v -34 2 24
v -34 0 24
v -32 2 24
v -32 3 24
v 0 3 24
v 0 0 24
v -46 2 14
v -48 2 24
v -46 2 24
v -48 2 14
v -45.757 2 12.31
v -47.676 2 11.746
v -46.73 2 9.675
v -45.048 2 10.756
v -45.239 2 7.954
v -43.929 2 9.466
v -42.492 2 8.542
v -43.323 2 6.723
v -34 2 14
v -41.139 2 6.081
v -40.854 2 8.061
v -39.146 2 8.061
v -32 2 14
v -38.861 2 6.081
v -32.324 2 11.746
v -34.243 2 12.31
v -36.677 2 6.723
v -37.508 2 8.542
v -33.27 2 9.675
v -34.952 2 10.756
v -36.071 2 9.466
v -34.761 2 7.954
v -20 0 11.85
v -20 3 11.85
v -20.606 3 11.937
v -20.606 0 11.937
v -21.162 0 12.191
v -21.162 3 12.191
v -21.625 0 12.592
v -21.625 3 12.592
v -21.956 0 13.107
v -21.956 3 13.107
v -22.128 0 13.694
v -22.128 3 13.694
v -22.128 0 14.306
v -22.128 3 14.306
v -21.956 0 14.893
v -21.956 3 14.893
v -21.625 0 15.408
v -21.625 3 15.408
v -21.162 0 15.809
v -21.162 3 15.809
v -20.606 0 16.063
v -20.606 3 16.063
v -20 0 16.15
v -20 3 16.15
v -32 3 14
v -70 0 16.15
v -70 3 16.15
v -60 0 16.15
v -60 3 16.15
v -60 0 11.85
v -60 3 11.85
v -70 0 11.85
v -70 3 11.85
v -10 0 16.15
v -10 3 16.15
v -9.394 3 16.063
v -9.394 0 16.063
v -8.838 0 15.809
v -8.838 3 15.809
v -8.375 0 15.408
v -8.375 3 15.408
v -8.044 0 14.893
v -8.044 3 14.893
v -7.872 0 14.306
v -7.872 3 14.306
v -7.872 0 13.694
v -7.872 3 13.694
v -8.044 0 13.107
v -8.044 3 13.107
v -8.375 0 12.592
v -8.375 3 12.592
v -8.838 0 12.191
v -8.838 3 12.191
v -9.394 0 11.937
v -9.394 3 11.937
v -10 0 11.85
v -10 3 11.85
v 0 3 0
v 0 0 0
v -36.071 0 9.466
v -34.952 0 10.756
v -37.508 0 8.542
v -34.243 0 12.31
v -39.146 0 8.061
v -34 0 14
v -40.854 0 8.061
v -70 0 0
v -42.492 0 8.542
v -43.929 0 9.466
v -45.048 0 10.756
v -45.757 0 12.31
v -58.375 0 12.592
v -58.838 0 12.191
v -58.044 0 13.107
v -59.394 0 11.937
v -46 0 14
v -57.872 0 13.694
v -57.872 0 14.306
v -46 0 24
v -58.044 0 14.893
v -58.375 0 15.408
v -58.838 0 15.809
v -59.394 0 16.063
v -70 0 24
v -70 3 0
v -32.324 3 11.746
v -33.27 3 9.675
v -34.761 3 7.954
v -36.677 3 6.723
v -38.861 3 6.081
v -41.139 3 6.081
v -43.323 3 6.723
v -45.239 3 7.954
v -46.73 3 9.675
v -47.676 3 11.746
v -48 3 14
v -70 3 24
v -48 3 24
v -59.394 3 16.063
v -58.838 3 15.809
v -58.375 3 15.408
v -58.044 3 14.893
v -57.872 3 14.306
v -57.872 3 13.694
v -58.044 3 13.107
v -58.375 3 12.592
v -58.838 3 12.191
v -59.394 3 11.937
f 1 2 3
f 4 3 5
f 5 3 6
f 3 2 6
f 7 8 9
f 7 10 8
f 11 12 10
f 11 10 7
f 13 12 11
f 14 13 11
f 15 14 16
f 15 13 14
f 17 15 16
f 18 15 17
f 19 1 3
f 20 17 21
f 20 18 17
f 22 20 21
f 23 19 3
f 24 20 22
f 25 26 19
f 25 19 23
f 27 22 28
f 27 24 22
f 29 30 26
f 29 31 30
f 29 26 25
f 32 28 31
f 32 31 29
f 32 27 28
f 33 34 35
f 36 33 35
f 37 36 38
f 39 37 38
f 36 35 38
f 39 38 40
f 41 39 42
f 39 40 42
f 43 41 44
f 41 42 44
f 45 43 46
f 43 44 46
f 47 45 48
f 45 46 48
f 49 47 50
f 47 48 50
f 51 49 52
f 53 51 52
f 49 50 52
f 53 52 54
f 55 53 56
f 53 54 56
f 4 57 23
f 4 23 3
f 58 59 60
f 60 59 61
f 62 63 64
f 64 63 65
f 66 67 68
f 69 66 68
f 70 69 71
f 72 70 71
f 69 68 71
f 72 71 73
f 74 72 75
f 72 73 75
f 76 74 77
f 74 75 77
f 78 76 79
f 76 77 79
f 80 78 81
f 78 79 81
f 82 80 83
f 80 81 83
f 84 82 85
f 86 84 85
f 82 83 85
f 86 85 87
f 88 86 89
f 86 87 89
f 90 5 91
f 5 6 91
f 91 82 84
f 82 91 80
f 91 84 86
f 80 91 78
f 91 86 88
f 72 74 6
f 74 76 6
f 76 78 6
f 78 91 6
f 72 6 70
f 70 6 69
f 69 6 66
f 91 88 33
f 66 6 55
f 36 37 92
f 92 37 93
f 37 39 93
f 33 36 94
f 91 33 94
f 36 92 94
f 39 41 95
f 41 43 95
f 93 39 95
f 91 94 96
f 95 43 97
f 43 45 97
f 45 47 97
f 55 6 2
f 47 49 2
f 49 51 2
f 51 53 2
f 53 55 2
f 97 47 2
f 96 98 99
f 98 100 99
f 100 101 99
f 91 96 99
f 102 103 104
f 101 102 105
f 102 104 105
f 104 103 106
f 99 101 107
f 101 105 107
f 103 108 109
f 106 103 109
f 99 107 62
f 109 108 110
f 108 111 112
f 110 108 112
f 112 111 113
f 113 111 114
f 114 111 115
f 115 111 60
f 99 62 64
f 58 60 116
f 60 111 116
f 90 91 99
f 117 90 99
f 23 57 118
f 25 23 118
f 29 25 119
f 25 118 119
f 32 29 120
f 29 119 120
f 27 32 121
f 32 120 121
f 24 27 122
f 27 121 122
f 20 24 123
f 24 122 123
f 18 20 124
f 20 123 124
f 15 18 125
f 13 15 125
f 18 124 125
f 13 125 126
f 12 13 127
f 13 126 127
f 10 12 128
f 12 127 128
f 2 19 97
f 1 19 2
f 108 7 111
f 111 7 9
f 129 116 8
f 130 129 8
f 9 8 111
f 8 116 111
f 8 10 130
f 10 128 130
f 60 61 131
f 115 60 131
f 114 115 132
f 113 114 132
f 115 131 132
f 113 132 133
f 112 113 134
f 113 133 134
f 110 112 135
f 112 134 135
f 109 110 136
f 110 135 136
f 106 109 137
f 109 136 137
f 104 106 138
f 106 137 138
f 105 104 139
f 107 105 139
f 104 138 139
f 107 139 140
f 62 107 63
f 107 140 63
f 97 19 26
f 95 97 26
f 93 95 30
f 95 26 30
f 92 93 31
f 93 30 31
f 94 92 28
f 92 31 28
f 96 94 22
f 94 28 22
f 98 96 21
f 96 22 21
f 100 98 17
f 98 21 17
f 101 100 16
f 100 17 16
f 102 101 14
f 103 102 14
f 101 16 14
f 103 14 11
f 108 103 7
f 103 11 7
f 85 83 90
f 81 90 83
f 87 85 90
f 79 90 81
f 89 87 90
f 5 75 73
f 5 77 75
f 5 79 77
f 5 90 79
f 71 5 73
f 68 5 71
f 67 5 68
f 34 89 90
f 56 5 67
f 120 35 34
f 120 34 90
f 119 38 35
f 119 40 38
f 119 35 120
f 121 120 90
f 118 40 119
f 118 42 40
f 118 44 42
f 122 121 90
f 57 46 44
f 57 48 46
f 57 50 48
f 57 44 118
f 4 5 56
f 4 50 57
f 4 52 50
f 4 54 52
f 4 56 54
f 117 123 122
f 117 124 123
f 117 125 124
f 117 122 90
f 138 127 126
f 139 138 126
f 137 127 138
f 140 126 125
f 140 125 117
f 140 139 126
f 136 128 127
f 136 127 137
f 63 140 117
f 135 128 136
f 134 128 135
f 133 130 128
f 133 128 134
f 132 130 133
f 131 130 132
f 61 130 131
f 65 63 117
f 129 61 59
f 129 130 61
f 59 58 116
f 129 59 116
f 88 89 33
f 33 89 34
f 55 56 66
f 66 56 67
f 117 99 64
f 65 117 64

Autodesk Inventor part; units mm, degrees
ref_plane "YZ Plane" through (0, 0, 0) normal (1, 0, 0) x (0, 1, 0)
ref_plane "XZ Plane" through (0, 0, 0) normal (0, 1, 0) x (-1, 0, 0)
ref_plane "XY Plane" through (0, 0, 0) normal (0, 0, 1) x (1, 0, 0)
sketch "Sketch1" plane through (0, 0, 0) normal (0, 1, 0) x (-1, 0, 0)
  line L0 (0, 0) -> (70, 0)
  line L1 (70, 0) -> (70, 24)
  line L2 (70, 24) -> (0, 24)
  line L3 (0, 24) -> (0, 0)
  dimension "d0" = 70
  dimension "d1" = 24
extrude "Extrusion1" add sketch "Sketch1" along normal blind 3
sketch "Sketch2" plane through (0, 3, 0) normal (0, 1, 0) x (1, 0, 0)
  line L0 (-70, 0) -> (-70, -24) projected
  line L1 (-70, -24) -> (0, -24) projected
  arc A0 (-32, -14) -> (-48, -14) centre (-40, -14) ccw
  line L2 (-32, -14) -> (-32, -24)
  line L3 (-48, -14) -> (-48, -24)
  dimension "d5" = 16
  dimension "d6" = 10
  dimension "d8" = 30
extrude "Extrusion2" cut sketch "Sketch2" against normal blind 1
sketch "Sketch3" plane through (0, 2, 0) normal (0, 1, 0) x (1, 0, 0)
  arc A0 (-32, -14) -> (-48, -14) centre (-40, -14) ccw projected
  line L0 (-32, -24) -> (-48, -24) projected
  arc A1 (-34, -14) -> (-46, -14) centre (-40, -14) ccw
  line L1 (-46, -14) -> (-46, -24)
  line L2 (-34, -14) -> (-34, -24)
  point P0 (0, 0)
  dimension "d11" = 12
extrude "Extrusion3" cut sketch "Sketch3" against normal blind 2
sketch "Sketch4" plane through (0, 3, 0) normal (0, 1, 0) x (1, 0, 0)
  line L0 (-32, -24) -> (0, -24) projected
  line L1 (0, -24) -> (0, 0) projected
  line L2 (-70, 0) -> (-70, -24) projected
  arc A0 (-32, -14) -> (-48, -14) centre (-40, -14) ccw projected
  line L3 (-70, -14) -> (-60, -14) construction
  line L4 (-70, -16.15) -> (-60, -16.15)
  line L5 (-60, -11.85) -> (-70, -11.85)
  arc A1 (-70, -11.85) -> (-70, -16.15) centre (-70, -14) ccw
  arc A2 (-60, -16.15) -> (-60, -11.85) centre (-60, -14) ccw
  line L6 (-20, -14) -> (-10, -14) construction
  line L7 (-20, -16.15) -> (-10, -16.15)
  line L8 (-10, -11.85) -> (-20, -11.85)
  arc A3 (-20, -11.85) -> (-20, -16.15) centre (-20, -14) ccw
  arc A4 (-10, -16.15) -> (-10, -11.85) centre (-10, -14) ccw
  point P0 (-65, -14)
  point P1 (-15, -14)
  dimension "d14" = 5
  dimension "d15" = 4.3
  dimension "d16" = 5
  dimension "d17" = 5
  dimension "d18" = 4.3
  dimension "d19" = 15
extrude "Extrusion4" cut sketch "Sketch4" against normal blind 3
properties part number "JHeadMount" material "Aluminum 6061"
